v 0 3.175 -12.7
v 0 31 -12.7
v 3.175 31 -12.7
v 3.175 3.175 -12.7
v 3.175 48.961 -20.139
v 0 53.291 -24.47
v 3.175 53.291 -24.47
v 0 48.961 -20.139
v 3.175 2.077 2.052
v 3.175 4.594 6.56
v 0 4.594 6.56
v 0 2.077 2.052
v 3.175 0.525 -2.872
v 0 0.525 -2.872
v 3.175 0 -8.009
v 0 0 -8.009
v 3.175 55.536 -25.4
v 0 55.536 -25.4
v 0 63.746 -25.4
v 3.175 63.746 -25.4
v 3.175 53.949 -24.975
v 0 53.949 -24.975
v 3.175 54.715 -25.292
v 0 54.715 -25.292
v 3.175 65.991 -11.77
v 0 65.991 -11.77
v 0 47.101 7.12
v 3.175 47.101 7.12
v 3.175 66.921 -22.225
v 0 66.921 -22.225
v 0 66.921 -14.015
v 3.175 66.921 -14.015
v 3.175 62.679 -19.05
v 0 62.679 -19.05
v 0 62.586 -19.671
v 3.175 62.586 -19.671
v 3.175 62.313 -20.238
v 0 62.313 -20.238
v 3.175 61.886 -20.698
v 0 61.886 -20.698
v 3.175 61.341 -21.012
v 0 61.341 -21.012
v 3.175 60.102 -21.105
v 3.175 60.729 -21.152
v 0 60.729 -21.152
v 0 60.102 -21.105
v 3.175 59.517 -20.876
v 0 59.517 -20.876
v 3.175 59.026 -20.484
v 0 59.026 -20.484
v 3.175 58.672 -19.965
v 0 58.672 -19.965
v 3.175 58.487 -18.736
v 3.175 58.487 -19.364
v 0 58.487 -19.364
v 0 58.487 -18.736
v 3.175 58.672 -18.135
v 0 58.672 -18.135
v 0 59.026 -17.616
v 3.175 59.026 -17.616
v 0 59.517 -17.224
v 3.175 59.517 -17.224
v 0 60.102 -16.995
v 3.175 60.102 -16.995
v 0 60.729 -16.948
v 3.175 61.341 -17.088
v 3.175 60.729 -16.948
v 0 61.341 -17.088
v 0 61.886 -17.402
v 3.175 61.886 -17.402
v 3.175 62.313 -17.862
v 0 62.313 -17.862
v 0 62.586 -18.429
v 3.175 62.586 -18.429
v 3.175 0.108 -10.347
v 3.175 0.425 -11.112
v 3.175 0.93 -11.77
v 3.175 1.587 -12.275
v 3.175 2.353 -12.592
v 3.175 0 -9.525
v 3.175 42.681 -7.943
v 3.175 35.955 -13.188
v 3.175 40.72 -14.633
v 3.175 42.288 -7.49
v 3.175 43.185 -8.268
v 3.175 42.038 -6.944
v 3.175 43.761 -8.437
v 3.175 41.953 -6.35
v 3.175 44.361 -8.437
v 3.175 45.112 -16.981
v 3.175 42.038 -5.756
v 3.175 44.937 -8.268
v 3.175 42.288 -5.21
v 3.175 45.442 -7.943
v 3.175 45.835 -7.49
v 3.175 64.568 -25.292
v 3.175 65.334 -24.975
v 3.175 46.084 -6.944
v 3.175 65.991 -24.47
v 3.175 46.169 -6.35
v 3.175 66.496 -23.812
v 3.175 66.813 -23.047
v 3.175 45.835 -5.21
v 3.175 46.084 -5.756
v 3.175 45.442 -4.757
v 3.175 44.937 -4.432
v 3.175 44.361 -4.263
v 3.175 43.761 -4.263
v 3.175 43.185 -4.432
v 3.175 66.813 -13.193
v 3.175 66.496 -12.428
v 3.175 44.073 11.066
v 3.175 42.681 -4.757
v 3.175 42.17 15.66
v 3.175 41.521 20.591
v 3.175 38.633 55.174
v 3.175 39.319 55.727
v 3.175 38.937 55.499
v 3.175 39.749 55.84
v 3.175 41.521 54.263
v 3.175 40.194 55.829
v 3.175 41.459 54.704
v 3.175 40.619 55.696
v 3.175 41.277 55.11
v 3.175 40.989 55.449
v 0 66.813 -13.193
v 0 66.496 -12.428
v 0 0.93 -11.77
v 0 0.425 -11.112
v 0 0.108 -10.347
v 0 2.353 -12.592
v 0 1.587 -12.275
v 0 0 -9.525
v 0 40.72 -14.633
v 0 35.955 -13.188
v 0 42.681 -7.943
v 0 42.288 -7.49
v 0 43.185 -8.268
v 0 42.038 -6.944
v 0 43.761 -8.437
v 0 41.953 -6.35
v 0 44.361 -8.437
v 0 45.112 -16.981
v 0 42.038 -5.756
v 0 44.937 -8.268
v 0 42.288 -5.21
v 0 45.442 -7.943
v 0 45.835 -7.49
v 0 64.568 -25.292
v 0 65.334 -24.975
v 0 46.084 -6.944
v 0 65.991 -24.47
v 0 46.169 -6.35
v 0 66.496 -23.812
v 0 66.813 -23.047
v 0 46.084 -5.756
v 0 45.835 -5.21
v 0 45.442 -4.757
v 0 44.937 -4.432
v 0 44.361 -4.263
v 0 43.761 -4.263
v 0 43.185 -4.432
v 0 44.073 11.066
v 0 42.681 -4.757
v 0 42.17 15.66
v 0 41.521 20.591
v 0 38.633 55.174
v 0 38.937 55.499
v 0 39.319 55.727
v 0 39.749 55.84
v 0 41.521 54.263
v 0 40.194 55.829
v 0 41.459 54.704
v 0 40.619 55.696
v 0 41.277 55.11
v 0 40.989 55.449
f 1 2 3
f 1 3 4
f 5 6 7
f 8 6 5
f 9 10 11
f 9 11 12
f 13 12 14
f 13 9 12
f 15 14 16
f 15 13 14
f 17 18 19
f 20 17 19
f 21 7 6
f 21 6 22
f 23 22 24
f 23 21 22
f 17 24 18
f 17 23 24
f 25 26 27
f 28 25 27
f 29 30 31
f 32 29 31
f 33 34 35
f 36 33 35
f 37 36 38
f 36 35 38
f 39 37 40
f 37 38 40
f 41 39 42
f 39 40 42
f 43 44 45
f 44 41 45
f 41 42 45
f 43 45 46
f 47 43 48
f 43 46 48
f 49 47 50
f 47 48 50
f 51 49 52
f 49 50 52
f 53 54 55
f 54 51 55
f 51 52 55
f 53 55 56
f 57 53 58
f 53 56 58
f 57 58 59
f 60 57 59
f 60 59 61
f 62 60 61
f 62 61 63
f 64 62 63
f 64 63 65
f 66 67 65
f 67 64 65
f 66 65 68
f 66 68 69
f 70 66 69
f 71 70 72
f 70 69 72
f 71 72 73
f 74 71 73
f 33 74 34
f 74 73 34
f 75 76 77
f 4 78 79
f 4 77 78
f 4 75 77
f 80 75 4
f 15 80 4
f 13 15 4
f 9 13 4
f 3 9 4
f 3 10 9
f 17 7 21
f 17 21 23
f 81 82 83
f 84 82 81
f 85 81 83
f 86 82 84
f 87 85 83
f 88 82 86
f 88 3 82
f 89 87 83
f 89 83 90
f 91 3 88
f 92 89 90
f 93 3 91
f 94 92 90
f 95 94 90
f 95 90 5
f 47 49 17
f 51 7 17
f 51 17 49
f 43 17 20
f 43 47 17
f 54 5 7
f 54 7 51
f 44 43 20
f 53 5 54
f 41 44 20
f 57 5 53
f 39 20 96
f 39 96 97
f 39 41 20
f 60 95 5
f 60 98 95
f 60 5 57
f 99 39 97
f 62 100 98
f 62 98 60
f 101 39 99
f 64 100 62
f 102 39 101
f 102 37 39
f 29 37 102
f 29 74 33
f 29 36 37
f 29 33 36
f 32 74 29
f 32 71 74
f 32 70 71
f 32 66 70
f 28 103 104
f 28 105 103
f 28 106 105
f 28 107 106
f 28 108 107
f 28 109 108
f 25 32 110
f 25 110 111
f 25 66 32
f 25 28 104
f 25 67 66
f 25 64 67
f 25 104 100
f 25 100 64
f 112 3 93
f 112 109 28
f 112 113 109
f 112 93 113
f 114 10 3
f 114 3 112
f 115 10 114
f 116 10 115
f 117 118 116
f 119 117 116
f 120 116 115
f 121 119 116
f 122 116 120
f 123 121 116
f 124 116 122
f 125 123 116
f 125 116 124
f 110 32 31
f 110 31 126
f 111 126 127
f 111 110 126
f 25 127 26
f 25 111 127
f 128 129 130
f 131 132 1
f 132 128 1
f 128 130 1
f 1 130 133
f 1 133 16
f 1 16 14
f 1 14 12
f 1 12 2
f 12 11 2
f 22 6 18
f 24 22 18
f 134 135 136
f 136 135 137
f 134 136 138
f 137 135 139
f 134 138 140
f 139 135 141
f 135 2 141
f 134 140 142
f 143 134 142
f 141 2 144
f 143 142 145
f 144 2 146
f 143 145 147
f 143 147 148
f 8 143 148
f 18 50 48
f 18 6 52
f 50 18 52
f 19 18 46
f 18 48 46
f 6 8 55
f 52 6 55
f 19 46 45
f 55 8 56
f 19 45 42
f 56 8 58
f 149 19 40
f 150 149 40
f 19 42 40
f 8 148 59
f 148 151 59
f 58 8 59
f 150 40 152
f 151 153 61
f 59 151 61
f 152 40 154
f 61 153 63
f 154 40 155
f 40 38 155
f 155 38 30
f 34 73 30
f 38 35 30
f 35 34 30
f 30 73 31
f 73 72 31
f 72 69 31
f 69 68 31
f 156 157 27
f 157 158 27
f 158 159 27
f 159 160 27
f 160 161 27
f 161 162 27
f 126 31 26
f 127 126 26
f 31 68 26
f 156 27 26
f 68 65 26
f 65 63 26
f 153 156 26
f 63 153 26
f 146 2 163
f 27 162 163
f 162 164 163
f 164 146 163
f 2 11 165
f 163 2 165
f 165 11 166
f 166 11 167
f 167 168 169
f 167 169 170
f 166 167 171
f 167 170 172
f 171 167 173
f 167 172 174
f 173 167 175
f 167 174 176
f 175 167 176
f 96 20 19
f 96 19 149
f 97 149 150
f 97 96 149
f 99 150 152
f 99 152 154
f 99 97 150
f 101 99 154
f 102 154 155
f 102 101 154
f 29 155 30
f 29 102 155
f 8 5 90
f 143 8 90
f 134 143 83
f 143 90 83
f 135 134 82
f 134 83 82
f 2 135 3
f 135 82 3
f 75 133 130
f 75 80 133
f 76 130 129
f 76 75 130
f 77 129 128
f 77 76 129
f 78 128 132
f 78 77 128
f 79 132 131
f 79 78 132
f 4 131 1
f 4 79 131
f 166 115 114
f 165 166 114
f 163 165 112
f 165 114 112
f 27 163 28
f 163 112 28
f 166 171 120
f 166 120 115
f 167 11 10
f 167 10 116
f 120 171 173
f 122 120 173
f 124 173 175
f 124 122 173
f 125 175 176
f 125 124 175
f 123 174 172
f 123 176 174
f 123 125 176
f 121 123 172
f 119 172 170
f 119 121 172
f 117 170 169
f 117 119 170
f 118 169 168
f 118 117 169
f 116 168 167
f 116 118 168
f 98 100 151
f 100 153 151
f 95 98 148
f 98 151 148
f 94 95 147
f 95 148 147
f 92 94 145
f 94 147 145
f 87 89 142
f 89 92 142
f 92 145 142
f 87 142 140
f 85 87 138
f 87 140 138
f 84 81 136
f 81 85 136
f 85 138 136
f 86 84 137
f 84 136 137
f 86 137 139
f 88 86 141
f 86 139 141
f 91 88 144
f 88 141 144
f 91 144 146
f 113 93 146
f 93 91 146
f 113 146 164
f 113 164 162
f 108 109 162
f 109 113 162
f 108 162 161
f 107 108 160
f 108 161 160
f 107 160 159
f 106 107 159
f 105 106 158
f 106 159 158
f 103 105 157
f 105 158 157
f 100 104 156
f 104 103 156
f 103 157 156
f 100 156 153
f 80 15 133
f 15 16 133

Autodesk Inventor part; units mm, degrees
ref_plane "YZ Plane" through (0, 0, 0) normal (1, 0, 0) x (0, 1, 0)
ref_plane "XZ Plane" through (0, 0, 0) normal (0, 1, 0) x (-1, 0, 0)
ref_plane "XY Plane" through (0, 0, 0) normal (0, 0, 1) x (1, 0, 0)
sketch "Sketch1" plane through (0, 0, 0) normal (1, 0, 0) x (0, 1, 0)
  line L0 (0, 0) -> (0, -12.7)
  line L1 (0, 0) -> (41.5212, 59.2984)
  line L2 (41.5212, 59.2984) -> (41.5212, -12.7)
  line L3 (41.5212, -12.7) -> (0, -12.7)
  line L4 (41.5212, 2.0806) -> (41.5212, -12.7)
  line L5 (41.5212, -12.7) -> (66.9212, -12.7)
  line L6 (41.5212, 8.3226) -> (41.5212, -12.7)
  line L7 (41.5212, 0) -> (66.9212, 0)
  line L8 (66.9212, 0) -> (66.9212, -12.7)
  line L9 (66.9212, -12.7) -> (41.5212, -12.7)
  line L10 (41.5212, -12.7) -> (41.5212, 0)
  line L11 (41.5212, -6.35) -> (44.0612, -6.35)
  circle A0 centre (44.0612, -6.35) radius 2.1082
  line L12 (66.9212, -12.7) -> (54.2212, -12.7)
  line L13 (54.2212, -12.7) -> (54.2212, -25.4)
  line L14 (54.2212, -25.4) -> (66.9212, -25.4)
  line L15 (66.9212, -25.4) -> (66.9212, -12.7)
  circle A1 centre (60.5712, -19.05) radius 2.1082
  line L16 (54.2212, 0) -> (66.9212, -12.7)
  line L17 (54.2212, -25.4) -> (41.5212, -12.7)
  line L18 (54.2212, 0) -> (41.5212, 12.7)
  point P0 (41.5212, 8.3226)
  point P1 (41.5212, 0)
  point P2 (41.5212, -12.7)
  dimension "d0" = 12.7
  dimension "d1" = 72.39
  dimension "d3" = 145
  dimension "d20" = 2.54
  dimension "d22" = 4.2164
  dimension "d23" = 12.7
  dimension "d24" = 12.7
  dimension "d25" = 25.4
  dimension "d26" = 25.4
  dimension "d27" = 4.2164
  dimension "d30" = 45
extrude "Extrusion1" add sketch "Sketch1" along normal blind 3.175 contours L1 L2 L3 L0 | L2 L7 L16 L5 | L5 L13 L17 | L18 L7 L2 | L5 L15 L14 L13
fillet "Fillet1" radius 1.5875 1 edges at (1.5875, 41.5212, 59.2984)
fillet "Fillet7" radius 19.05 1 edges at (1.5875, 41.5212, 12.7)
fillet "Fillet8" radius 25.4 1 edges at (1.5875, 41.5212, -12.7)
fillet "Fillet9" radius 3.175 4 edges at (1.5875, 54.2212, -25.4) (1.5875, 66.9212, -25.4) (1.5875, 66.9212, -12.7) (1.5875, 0, -12.7)
fillet "Fillet10" radius 25.4 1 edges at (1.5875, 0, 0)
properties part number "flip out sleds"
